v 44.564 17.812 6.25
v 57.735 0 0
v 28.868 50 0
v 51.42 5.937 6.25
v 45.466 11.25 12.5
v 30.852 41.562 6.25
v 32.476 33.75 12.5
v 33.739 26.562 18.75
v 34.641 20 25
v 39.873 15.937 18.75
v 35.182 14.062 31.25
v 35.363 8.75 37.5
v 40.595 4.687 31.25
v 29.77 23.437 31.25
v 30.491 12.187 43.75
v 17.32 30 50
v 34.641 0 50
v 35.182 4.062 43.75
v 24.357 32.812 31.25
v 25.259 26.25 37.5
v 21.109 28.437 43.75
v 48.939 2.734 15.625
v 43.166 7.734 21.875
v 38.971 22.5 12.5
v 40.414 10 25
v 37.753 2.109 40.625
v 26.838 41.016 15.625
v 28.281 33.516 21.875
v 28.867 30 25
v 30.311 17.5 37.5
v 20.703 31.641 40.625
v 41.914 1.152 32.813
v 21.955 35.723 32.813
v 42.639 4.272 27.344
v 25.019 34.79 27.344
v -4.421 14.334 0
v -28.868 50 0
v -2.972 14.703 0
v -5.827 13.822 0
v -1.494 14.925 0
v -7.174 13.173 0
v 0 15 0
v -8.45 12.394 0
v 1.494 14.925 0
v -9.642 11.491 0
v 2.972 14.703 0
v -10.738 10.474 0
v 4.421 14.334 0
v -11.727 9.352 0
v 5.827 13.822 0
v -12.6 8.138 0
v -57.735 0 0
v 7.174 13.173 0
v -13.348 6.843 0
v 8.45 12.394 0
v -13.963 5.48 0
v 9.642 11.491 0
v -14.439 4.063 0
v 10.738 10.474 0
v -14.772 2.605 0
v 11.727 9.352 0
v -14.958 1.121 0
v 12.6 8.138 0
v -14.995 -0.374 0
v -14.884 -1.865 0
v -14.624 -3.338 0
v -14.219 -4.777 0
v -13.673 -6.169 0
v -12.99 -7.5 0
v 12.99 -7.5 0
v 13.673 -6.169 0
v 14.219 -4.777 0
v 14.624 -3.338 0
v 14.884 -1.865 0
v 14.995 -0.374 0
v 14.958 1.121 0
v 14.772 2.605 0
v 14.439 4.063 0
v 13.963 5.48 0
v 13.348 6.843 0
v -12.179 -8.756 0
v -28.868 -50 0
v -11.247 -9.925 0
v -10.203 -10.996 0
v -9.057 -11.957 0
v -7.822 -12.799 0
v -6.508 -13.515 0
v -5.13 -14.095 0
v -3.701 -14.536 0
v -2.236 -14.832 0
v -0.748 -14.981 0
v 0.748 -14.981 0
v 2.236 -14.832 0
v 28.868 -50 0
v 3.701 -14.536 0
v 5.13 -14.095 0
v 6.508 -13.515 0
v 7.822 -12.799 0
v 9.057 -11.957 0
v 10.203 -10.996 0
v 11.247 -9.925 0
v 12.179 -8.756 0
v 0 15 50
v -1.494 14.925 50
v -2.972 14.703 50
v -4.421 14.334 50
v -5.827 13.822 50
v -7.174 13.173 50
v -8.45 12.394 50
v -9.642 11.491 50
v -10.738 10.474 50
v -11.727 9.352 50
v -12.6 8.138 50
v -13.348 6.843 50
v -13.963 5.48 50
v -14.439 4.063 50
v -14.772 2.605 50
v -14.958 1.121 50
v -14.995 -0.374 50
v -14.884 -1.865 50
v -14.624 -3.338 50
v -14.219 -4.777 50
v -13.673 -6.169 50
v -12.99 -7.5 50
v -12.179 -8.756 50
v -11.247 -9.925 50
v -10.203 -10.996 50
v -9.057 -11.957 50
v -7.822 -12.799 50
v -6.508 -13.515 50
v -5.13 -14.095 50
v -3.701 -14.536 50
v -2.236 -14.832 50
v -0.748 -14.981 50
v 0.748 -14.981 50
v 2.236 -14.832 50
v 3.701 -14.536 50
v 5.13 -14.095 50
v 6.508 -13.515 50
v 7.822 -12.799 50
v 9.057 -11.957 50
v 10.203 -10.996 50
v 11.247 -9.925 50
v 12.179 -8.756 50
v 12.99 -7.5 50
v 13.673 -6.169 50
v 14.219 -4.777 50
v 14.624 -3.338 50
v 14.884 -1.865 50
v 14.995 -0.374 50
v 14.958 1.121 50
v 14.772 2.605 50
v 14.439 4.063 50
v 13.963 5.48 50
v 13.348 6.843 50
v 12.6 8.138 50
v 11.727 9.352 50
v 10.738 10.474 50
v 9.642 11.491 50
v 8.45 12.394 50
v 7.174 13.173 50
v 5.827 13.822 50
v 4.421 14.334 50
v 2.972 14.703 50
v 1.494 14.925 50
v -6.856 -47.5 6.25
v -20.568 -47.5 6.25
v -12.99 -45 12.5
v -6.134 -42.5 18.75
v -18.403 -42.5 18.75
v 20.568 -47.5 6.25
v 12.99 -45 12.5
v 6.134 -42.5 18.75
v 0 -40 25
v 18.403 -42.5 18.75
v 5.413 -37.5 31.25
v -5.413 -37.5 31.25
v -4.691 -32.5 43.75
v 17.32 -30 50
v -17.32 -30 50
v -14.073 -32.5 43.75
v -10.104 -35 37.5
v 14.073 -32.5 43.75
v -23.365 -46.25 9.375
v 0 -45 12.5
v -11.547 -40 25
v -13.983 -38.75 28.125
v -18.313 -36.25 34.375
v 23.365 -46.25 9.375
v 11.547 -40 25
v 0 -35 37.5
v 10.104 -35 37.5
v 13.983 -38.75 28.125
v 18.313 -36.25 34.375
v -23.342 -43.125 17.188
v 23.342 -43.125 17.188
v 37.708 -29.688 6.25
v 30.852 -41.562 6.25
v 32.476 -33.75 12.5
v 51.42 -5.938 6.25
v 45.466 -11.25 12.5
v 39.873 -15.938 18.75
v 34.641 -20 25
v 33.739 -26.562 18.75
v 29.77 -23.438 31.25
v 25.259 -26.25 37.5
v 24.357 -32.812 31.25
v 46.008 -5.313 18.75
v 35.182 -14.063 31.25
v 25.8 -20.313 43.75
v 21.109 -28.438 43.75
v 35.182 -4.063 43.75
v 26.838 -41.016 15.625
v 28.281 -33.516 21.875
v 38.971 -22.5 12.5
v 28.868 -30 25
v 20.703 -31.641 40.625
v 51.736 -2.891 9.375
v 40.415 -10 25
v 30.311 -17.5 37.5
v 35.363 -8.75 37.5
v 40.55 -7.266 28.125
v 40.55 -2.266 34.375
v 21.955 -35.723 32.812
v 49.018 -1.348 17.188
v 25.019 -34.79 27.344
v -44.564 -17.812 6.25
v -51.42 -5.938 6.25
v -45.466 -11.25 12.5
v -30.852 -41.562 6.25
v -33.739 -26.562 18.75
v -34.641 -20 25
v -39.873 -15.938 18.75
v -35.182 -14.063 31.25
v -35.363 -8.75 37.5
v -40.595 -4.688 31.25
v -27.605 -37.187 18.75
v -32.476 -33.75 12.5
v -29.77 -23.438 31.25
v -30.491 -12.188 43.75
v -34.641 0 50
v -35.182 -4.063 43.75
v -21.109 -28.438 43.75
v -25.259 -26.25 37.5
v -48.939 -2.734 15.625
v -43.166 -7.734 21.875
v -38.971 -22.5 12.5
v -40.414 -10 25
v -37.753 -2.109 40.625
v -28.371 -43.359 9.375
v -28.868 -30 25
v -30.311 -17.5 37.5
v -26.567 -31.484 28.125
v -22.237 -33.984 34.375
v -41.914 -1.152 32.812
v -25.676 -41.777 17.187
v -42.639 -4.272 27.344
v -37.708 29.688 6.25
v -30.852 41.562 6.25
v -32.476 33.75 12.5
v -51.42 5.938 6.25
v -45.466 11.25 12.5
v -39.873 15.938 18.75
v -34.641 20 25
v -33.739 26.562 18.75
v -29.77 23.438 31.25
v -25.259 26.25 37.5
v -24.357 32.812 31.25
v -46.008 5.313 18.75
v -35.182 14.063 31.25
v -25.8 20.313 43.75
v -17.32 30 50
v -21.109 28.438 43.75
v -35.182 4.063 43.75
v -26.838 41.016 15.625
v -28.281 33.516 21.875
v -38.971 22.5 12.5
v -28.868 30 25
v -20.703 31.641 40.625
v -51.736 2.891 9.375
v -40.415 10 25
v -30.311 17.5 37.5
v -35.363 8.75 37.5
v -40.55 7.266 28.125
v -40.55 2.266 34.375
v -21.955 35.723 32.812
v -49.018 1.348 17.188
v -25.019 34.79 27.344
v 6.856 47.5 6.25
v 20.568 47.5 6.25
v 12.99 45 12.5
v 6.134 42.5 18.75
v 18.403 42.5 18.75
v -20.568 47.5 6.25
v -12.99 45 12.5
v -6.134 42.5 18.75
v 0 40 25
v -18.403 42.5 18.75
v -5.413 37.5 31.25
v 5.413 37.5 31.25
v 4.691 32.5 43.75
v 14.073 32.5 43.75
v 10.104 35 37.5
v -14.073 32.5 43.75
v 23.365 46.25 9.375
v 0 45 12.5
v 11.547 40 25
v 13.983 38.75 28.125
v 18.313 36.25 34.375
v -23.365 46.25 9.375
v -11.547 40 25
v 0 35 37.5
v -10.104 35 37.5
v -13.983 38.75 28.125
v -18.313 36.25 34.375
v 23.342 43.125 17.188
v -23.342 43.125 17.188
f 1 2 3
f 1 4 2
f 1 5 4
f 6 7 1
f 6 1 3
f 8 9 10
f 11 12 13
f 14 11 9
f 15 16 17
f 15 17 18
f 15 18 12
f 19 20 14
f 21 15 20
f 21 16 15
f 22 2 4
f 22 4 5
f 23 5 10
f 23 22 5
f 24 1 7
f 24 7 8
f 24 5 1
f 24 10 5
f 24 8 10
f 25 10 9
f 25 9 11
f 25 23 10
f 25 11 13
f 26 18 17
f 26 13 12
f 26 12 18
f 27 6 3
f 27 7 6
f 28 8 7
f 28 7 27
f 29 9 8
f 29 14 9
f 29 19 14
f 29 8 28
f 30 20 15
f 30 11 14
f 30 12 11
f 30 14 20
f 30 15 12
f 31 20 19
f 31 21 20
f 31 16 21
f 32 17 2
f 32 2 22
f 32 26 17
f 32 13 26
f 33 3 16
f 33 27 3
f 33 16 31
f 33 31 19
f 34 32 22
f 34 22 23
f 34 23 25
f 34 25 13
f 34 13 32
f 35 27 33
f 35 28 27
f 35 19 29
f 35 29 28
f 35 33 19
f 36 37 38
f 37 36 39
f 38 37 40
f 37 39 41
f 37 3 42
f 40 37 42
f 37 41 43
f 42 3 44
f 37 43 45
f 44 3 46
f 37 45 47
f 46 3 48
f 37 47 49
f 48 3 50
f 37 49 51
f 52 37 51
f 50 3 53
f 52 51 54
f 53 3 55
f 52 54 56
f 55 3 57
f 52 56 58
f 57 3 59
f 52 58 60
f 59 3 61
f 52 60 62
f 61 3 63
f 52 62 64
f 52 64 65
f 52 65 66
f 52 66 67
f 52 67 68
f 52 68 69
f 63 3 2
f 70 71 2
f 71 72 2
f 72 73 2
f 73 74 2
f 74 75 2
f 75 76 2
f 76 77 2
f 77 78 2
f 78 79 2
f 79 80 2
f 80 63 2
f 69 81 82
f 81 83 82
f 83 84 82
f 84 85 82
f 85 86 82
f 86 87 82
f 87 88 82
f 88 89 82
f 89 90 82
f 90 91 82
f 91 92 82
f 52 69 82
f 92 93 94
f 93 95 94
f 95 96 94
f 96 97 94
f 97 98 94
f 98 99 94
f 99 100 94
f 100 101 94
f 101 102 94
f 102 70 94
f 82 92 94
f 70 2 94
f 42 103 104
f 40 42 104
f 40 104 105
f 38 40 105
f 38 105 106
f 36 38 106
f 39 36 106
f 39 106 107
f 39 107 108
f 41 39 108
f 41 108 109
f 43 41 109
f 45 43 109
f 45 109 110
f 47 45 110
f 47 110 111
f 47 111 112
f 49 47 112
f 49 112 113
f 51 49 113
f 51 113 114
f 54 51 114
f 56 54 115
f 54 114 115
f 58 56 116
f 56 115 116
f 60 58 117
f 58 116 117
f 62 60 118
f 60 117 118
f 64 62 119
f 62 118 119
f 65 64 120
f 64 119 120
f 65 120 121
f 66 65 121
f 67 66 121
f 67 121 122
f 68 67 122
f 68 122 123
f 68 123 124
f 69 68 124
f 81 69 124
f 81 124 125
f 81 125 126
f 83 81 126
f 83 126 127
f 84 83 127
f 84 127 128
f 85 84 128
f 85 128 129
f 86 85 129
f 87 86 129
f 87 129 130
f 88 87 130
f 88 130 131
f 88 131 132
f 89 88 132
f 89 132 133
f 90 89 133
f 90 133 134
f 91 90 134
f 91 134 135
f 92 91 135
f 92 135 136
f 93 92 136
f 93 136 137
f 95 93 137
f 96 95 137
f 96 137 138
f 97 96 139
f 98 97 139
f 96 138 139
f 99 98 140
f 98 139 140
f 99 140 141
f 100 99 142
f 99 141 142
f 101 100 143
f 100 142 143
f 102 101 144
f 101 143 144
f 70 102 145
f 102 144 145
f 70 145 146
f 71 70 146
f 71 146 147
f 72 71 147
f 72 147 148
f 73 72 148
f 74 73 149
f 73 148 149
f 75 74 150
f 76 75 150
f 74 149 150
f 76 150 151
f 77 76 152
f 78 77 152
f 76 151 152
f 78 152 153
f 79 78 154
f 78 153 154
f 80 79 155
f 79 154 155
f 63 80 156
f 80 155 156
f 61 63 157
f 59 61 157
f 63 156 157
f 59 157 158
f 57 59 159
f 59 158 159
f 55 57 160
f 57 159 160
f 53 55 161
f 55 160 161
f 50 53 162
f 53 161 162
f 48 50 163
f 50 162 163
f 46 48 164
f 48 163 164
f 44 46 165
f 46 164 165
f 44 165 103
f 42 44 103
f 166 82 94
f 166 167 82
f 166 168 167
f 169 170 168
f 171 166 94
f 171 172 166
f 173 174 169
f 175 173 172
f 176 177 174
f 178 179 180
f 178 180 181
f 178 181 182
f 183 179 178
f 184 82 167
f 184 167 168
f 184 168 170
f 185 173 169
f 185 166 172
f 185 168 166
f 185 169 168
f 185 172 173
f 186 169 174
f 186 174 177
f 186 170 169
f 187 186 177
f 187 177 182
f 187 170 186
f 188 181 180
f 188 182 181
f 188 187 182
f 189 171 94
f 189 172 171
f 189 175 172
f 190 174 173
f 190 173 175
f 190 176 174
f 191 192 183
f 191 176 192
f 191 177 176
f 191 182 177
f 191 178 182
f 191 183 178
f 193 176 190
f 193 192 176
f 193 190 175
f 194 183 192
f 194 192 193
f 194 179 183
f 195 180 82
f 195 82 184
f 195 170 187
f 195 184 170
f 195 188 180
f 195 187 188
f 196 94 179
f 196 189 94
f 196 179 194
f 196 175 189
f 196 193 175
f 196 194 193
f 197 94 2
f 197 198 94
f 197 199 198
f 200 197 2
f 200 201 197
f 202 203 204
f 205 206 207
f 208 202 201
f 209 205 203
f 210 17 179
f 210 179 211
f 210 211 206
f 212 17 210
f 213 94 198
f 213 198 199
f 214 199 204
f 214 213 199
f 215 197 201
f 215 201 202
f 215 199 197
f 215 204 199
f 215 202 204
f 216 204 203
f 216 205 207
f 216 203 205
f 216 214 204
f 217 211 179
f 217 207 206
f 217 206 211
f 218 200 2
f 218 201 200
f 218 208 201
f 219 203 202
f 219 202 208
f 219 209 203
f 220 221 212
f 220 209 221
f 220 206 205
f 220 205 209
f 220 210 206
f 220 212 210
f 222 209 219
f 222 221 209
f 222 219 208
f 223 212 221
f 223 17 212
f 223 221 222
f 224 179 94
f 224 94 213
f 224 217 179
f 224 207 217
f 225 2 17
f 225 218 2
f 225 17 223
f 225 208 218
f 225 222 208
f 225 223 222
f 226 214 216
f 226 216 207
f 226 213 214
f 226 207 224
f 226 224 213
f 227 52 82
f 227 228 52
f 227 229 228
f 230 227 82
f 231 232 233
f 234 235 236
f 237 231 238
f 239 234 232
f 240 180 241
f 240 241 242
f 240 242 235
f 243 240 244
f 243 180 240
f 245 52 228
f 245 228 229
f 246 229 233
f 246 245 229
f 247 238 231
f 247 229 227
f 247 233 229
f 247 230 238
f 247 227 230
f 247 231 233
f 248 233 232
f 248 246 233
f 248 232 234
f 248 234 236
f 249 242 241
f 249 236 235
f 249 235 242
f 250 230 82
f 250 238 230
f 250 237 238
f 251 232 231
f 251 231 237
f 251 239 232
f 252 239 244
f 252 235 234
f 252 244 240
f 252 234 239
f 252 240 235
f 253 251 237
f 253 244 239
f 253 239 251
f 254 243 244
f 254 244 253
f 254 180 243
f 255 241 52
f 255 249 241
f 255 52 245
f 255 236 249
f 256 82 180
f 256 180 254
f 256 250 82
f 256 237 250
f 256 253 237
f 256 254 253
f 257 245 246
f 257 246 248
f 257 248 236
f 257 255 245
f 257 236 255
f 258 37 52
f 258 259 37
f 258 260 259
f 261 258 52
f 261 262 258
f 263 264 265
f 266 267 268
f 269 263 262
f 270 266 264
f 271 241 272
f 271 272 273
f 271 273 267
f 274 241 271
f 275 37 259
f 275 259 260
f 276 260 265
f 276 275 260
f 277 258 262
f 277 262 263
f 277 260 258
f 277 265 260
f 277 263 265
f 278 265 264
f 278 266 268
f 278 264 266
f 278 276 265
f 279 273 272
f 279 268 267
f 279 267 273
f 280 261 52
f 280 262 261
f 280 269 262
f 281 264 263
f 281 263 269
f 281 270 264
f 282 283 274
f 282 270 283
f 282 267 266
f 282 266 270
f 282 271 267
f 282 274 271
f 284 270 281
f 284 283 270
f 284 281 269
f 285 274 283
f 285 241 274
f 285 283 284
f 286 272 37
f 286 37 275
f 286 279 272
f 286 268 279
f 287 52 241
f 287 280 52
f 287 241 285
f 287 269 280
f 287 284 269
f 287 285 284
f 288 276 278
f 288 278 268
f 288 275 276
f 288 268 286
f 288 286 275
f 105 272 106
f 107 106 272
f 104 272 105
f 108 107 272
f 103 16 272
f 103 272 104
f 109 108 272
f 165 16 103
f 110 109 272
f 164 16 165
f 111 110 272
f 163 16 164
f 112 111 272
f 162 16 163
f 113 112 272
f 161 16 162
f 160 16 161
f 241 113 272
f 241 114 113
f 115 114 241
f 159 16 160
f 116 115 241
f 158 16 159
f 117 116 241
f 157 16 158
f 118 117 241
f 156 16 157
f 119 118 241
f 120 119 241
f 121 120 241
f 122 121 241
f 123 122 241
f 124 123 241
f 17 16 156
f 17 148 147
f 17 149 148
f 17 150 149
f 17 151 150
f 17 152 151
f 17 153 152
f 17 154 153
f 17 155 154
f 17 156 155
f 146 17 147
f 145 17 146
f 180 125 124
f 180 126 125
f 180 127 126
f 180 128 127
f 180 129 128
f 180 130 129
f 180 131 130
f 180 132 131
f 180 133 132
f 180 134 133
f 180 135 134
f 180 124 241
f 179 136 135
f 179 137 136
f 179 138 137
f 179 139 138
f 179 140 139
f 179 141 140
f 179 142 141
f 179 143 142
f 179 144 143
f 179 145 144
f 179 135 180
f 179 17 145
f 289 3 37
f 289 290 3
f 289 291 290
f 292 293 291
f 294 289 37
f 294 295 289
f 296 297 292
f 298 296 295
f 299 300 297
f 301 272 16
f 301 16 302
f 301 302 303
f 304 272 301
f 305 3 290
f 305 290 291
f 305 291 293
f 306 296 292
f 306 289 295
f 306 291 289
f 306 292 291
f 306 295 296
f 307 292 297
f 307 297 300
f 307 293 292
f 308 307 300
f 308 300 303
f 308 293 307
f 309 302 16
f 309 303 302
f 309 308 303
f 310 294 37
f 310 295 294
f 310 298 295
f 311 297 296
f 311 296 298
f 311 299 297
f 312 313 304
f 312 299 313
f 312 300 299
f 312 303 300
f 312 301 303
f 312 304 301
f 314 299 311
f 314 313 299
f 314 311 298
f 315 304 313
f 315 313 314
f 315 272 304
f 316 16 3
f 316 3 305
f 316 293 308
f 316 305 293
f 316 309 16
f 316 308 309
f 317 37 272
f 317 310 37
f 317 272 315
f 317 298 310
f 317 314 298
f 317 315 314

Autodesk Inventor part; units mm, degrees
ref_plane "YZ Plane" through (0, 0, 0) normal (1, 0, 0) x (0, 1, 0)
ref_plane "XZ Plane" through (0, 0, 0) normal (0, 1, 0) x (-1, 0, 0)
sketch "Sketch3" plane through (0, 0, 0) normal (0, 0, 1) x (1, 0, 0)
  line L0 (28.8675, 50) -> (57.735, 0)
  line L1 (57.735, 0) -> (28.8675, -50)
  line L2 (28.8675, -50) -> (-28.8675, -50)
  line L3 (-28.8675, -50) -> (-57.735, 0)
  line L4 (-57.735, 0) -> (-28.8675, 50)
  line L5 (-28.8675, 50) -> (28.8675, 50)
  point P0 (0, 0)
  point P1 (0, 50)
  dimension "DS_HEX_R1" = 50
ref_plane "Work Plane1" through (0, 0, 50) normal (0, 0, 1) x (1, 0, 0)
sketch "Sketch4" plane through (0, 0, 50) normal (0, 0, 1) x (1, 0, 0)
  line L0 (17.3205, 30) -> (34.641, 0)
  line L1 (34.641, 0) -> (17.3205, -30)
  line L2 (17.3205, -30) -> (-17.3205, -30)
  line L3 (-17.3205, -30) -> (-34.641, 0)
  line L4 (-34.641, 0) -> (-17.3205, 30)
  line L5 (-17.3205, 30) -> (17.3205, 30)
  point P0 (0, 0)
  point P1 (0, 0)
  point P2 (0, 30)
  dimension "d16" = 0
  dimension "DS_HEX_R2" = 30
loft "Loft1" add profiles "Sketch3", "Sketch4"
sketch "Sketch6" plane through (0, 0, 0) normal (0, 0, 1) x (1, 0, 0)
  point P0 (0, 0)
hole "Hole3" at (0, 0, 0) direction (0, 0, 1) diameter 30 end through all
properties part number "ai_param_dsdm_part1"
